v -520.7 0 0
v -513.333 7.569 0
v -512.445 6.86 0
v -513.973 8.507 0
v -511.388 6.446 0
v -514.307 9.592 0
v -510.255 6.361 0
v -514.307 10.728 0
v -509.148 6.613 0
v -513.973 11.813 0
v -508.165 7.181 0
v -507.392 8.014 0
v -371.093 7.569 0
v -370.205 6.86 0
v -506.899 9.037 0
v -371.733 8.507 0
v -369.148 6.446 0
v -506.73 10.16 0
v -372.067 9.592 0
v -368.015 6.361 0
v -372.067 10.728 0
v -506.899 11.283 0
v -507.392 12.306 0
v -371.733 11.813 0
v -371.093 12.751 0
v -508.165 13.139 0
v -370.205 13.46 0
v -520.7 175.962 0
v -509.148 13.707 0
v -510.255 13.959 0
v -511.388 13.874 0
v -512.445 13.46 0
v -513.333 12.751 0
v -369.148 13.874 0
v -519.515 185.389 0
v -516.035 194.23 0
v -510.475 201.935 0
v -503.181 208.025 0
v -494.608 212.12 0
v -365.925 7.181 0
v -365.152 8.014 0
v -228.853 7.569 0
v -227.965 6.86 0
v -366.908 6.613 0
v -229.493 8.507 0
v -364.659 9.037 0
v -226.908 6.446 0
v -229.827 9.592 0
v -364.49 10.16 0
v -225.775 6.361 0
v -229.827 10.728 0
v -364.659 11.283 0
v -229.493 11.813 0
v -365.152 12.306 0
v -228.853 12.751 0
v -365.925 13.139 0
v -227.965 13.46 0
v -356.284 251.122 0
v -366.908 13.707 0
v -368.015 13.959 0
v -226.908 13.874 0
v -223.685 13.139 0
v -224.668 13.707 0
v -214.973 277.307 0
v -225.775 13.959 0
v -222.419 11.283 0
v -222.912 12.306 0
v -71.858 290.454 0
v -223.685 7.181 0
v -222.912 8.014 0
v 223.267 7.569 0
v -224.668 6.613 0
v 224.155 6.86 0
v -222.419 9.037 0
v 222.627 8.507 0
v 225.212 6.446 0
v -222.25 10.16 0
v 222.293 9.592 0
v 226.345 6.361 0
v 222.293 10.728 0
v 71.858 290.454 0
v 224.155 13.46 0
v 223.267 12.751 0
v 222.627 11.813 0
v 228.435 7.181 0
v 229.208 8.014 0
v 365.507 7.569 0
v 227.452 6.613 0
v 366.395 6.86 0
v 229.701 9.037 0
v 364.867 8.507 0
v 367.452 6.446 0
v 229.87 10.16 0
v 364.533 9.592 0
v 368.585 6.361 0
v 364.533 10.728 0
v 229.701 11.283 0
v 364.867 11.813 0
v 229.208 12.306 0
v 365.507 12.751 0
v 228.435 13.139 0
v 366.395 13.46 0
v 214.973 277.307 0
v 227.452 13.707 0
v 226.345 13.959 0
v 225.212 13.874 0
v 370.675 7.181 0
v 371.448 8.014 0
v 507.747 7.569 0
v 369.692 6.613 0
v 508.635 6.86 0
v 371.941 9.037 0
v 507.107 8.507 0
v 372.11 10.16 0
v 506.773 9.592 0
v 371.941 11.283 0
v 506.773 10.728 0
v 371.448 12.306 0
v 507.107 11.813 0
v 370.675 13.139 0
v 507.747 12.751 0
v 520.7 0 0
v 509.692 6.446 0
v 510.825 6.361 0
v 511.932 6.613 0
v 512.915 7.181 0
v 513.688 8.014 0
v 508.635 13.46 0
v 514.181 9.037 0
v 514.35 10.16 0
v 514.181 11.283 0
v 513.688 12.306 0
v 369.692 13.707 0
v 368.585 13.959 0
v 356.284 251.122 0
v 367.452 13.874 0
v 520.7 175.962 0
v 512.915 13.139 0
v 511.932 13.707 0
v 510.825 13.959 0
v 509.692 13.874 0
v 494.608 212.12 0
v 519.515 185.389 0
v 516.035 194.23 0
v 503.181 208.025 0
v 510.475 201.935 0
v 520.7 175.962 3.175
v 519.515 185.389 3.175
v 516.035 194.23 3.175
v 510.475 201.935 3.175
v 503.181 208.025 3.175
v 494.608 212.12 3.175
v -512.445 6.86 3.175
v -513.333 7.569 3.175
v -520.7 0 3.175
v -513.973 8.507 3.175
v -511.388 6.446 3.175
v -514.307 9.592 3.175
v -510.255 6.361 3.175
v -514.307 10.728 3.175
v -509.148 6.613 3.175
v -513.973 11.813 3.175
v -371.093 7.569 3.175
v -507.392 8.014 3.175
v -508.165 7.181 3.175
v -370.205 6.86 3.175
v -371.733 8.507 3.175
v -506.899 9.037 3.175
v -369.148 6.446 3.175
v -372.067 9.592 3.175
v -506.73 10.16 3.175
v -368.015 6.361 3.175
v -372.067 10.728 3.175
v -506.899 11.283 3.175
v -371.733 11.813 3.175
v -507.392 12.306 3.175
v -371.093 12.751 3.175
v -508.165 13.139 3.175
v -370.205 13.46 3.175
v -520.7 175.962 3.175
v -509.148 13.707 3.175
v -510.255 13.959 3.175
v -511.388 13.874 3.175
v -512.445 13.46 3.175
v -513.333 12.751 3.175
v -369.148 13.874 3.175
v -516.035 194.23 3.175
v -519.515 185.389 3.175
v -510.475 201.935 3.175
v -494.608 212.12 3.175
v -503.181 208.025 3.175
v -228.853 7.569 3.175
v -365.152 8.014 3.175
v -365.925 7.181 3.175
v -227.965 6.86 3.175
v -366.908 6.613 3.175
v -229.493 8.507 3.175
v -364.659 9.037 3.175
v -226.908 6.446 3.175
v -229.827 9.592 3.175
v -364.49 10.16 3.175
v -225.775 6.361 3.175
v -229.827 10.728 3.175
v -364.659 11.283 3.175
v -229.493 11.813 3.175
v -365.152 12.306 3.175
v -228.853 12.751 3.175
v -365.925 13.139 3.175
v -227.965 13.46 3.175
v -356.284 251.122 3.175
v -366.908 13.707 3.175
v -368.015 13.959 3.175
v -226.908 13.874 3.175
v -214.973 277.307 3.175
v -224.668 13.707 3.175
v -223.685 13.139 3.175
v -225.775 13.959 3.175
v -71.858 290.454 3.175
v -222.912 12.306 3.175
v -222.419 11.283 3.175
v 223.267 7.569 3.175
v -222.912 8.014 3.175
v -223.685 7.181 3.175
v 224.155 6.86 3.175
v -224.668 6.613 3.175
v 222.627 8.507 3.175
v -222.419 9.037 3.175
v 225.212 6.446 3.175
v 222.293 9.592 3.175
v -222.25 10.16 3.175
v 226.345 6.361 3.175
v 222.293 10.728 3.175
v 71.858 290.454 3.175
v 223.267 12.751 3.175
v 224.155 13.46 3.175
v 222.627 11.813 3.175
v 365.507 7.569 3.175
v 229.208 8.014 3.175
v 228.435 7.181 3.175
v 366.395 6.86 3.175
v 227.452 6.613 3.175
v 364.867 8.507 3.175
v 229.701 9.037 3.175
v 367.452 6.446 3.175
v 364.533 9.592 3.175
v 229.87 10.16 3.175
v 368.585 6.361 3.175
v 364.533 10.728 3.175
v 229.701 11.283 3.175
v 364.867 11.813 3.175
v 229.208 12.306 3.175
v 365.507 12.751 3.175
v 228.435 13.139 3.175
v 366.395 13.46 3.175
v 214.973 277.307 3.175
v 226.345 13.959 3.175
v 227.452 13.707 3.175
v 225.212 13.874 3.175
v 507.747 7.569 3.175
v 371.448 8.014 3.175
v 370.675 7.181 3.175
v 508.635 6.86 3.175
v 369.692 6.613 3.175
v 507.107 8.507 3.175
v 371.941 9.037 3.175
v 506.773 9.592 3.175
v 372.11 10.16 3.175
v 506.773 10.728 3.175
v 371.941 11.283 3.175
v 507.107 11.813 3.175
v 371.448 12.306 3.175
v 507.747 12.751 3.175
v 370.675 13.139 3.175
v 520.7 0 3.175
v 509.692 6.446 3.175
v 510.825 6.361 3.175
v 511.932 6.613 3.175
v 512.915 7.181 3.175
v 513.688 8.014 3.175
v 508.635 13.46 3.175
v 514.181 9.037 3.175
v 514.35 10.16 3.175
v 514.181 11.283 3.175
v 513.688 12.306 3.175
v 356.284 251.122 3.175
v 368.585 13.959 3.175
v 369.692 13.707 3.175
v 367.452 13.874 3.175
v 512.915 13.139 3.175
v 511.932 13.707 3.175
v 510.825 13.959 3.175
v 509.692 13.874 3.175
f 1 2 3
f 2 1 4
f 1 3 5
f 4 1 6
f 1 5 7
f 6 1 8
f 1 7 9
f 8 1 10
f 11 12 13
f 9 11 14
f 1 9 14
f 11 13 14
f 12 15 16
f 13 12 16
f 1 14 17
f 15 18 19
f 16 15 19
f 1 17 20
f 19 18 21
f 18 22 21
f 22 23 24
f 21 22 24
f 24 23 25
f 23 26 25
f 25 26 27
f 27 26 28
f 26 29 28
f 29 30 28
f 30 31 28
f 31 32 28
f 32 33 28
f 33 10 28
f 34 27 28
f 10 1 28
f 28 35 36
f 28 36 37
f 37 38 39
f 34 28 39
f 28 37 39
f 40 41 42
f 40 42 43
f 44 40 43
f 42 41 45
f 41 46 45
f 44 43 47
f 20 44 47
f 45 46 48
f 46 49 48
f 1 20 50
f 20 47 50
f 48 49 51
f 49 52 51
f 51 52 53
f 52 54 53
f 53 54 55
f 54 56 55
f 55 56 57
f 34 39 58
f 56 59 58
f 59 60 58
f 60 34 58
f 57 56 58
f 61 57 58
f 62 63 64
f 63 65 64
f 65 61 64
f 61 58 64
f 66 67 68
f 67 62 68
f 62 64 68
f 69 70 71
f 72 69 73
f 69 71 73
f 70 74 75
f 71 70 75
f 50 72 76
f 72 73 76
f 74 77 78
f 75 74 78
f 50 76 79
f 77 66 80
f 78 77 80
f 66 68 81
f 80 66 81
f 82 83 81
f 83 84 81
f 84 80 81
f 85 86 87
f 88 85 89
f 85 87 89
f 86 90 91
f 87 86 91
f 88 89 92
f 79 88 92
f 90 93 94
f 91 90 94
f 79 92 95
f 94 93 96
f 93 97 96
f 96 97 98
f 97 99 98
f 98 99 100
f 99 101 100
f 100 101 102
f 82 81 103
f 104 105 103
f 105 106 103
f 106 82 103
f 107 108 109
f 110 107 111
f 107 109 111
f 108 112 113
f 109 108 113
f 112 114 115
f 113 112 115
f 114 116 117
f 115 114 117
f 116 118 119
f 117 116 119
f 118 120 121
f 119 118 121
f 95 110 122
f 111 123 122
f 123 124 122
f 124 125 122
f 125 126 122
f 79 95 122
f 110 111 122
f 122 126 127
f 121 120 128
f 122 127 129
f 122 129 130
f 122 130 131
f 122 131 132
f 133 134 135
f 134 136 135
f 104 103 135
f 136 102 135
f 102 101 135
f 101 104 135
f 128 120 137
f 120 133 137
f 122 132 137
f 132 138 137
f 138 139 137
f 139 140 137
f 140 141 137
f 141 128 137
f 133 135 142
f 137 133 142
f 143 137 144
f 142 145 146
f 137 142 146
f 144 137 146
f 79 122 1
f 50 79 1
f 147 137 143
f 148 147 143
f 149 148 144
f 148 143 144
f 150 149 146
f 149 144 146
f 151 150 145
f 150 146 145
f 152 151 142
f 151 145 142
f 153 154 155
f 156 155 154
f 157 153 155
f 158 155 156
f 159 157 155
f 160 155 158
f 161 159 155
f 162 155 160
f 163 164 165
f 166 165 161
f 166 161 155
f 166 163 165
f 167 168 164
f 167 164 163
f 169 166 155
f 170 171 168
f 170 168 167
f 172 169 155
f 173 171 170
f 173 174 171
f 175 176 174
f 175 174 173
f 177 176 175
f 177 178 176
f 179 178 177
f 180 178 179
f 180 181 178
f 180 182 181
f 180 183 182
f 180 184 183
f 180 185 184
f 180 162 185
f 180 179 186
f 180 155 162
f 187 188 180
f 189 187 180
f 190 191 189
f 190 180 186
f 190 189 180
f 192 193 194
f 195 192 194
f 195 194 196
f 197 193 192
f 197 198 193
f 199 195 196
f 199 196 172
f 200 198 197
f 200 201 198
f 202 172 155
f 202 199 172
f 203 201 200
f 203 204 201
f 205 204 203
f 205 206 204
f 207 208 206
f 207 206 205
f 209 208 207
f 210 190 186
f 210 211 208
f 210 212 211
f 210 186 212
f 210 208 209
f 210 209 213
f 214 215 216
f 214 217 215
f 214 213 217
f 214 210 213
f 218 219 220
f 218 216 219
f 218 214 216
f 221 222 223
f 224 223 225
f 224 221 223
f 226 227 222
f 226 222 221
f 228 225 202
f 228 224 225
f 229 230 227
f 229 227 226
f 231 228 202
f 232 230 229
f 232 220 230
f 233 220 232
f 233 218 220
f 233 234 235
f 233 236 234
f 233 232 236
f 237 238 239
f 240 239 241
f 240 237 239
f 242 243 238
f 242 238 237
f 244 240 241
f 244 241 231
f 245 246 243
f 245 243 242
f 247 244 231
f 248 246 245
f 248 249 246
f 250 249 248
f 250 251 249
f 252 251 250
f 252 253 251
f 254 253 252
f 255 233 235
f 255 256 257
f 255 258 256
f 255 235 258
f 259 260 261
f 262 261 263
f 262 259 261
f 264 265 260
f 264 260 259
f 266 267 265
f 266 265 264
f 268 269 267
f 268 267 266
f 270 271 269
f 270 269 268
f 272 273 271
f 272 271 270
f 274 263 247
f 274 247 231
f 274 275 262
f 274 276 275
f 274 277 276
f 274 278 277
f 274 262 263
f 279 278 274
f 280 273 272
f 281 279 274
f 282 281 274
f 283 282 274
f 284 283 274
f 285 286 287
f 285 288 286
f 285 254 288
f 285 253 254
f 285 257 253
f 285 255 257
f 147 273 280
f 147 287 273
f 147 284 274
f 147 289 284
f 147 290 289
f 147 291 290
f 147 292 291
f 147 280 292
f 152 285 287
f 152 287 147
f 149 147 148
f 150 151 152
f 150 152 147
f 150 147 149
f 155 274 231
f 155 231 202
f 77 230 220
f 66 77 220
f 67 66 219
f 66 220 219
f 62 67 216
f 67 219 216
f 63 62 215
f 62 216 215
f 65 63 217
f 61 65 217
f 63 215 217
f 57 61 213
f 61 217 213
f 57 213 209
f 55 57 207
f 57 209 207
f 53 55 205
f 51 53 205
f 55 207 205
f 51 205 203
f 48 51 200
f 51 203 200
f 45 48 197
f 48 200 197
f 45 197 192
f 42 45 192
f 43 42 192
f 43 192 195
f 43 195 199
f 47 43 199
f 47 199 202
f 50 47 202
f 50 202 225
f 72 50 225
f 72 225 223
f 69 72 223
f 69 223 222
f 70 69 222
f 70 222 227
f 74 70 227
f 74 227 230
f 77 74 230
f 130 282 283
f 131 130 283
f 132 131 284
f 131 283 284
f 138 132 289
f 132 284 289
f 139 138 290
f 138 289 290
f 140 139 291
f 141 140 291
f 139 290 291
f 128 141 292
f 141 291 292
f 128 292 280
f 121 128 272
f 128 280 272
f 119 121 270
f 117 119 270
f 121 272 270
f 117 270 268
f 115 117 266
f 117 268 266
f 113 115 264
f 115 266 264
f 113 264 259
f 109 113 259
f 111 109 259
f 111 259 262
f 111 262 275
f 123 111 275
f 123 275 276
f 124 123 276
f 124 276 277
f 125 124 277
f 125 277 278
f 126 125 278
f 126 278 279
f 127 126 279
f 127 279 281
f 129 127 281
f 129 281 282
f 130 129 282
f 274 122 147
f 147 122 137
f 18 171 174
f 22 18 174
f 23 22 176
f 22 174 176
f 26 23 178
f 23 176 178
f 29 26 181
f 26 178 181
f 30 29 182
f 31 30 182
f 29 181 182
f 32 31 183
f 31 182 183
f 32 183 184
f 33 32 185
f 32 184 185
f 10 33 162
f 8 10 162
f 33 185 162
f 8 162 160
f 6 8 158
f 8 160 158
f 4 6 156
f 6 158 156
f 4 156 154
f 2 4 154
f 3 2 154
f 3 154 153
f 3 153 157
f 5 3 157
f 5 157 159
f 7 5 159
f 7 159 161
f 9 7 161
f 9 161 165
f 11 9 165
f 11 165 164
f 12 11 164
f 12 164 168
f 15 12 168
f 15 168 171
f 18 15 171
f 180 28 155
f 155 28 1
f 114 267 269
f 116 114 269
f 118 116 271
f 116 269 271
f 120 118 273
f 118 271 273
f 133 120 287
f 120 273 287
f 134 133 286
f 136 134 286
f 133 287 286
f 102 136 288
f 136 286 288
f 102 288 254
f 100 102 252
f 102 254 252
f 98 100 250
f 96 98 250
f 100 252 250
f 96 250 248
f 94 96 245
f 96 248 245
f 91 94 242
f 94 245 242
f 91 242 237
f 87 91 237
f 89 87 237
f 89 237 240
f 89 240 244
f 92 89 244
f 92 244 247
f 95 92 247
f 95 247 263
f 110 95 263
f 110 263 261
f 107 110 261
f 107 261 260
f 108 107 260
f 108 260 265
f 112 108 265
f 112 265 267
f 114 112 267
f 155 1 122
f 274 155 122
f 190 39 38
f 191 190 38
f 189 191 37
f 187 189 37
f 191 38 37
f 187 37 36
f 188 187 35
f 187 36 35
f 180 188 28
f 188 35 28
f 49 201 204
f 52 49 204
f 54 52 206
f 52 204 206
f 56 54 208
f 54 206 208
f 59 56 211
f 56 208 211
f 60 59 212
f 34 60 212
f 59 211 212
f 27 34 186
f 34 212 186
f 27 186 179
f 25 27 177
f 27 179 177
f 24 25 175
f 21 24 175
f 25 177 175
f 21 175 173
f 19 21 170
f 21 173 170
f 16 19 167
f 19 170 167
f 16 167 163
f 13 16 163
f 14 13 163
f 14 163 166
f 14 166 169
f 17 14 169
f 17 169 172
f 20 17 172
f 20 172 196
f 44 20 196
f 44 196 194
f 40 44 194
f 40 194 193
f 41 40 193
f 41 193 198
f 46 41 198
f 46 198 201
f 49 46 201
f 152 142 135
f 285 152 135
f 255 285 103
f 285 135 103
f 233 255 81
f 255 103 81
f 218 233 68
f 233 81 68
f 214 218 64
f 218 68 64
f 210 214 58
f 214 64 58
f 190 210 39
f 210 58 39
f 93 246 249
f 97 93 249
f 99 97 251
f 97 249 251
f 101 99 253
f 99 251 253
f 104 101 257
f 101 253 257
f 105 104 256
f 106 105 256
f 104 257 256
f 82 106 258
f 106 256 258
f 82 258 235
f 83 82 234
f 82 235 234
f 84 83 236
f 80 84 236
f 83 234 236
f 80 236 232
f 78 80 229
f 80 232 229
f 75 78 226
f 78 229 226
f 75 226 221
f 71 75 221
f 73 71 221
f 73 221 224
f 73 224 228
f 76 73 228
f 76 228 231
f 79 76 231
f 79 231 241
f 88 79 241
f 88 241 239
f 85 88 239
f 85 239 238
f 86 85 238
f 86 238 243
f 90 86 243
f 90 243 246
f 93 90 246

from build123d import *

# Parameters (mm, degrees)
F1_DEPTH = 3.175
F2_R     = 3.81
F3_DEPTH = 25.4


with BuildPart() as f1:
    # F0 (on Top) → F1 (new body)
    with BuildSketch(Plane.XY):
        with BuildLine():
            Line((-515.62, 0), (0, 0))
            Line((0, 0), (515.62, 0))
            Line((515.62, 0), (520.7, 0))
            Line((520.7, 0), (520.7, 5.08))
            Line((520.7, 5.08), (520.7, 175.961931))
            ThreePointArc((520.7, 175.961931), (513.495857, 198.256685), (494.60782, 212.120226))
            ThreePointArc((494.60782, 212.120226), (0, 292.1), (-494.60782, 212.120226))
            ThreePointArc((-494.60782, 212.120226), (-513.495857, 198.256685), (-520.7, 175.961931))
            Line((-520.7, 175.961931), (-520.7, 5.08))
            Line((-520.7, 5.08), (-520.7, 0))
            Line((-520.7, 0), (-515.62, 0))
        make_face()
    extrude(amount=F1_DEPTH)

    # F2 (on face) → F3 (cut)
    with BuildSketch(Plane.XY.offset(3.175)):
        with Locations((510.54, 10.16)):
            Circle(F2_R)
        with Locations((368.3, 10.16)):
            Circle(F2_R)
        with Locations((226.06, 10.16)):
            Circle(F2_R)
        with Locations((-226.06, 10.16)):
            Circle(F2_R)
        with Locations((-368.3, 10.16)):
            Circle(F2_R)
        with Locations((-510.54, 10.16)):
            Circle(F2_R)
    extrude(amount=-F3_DEPTH, mode=Mode.SUBTRACT)


solid = f1.part
